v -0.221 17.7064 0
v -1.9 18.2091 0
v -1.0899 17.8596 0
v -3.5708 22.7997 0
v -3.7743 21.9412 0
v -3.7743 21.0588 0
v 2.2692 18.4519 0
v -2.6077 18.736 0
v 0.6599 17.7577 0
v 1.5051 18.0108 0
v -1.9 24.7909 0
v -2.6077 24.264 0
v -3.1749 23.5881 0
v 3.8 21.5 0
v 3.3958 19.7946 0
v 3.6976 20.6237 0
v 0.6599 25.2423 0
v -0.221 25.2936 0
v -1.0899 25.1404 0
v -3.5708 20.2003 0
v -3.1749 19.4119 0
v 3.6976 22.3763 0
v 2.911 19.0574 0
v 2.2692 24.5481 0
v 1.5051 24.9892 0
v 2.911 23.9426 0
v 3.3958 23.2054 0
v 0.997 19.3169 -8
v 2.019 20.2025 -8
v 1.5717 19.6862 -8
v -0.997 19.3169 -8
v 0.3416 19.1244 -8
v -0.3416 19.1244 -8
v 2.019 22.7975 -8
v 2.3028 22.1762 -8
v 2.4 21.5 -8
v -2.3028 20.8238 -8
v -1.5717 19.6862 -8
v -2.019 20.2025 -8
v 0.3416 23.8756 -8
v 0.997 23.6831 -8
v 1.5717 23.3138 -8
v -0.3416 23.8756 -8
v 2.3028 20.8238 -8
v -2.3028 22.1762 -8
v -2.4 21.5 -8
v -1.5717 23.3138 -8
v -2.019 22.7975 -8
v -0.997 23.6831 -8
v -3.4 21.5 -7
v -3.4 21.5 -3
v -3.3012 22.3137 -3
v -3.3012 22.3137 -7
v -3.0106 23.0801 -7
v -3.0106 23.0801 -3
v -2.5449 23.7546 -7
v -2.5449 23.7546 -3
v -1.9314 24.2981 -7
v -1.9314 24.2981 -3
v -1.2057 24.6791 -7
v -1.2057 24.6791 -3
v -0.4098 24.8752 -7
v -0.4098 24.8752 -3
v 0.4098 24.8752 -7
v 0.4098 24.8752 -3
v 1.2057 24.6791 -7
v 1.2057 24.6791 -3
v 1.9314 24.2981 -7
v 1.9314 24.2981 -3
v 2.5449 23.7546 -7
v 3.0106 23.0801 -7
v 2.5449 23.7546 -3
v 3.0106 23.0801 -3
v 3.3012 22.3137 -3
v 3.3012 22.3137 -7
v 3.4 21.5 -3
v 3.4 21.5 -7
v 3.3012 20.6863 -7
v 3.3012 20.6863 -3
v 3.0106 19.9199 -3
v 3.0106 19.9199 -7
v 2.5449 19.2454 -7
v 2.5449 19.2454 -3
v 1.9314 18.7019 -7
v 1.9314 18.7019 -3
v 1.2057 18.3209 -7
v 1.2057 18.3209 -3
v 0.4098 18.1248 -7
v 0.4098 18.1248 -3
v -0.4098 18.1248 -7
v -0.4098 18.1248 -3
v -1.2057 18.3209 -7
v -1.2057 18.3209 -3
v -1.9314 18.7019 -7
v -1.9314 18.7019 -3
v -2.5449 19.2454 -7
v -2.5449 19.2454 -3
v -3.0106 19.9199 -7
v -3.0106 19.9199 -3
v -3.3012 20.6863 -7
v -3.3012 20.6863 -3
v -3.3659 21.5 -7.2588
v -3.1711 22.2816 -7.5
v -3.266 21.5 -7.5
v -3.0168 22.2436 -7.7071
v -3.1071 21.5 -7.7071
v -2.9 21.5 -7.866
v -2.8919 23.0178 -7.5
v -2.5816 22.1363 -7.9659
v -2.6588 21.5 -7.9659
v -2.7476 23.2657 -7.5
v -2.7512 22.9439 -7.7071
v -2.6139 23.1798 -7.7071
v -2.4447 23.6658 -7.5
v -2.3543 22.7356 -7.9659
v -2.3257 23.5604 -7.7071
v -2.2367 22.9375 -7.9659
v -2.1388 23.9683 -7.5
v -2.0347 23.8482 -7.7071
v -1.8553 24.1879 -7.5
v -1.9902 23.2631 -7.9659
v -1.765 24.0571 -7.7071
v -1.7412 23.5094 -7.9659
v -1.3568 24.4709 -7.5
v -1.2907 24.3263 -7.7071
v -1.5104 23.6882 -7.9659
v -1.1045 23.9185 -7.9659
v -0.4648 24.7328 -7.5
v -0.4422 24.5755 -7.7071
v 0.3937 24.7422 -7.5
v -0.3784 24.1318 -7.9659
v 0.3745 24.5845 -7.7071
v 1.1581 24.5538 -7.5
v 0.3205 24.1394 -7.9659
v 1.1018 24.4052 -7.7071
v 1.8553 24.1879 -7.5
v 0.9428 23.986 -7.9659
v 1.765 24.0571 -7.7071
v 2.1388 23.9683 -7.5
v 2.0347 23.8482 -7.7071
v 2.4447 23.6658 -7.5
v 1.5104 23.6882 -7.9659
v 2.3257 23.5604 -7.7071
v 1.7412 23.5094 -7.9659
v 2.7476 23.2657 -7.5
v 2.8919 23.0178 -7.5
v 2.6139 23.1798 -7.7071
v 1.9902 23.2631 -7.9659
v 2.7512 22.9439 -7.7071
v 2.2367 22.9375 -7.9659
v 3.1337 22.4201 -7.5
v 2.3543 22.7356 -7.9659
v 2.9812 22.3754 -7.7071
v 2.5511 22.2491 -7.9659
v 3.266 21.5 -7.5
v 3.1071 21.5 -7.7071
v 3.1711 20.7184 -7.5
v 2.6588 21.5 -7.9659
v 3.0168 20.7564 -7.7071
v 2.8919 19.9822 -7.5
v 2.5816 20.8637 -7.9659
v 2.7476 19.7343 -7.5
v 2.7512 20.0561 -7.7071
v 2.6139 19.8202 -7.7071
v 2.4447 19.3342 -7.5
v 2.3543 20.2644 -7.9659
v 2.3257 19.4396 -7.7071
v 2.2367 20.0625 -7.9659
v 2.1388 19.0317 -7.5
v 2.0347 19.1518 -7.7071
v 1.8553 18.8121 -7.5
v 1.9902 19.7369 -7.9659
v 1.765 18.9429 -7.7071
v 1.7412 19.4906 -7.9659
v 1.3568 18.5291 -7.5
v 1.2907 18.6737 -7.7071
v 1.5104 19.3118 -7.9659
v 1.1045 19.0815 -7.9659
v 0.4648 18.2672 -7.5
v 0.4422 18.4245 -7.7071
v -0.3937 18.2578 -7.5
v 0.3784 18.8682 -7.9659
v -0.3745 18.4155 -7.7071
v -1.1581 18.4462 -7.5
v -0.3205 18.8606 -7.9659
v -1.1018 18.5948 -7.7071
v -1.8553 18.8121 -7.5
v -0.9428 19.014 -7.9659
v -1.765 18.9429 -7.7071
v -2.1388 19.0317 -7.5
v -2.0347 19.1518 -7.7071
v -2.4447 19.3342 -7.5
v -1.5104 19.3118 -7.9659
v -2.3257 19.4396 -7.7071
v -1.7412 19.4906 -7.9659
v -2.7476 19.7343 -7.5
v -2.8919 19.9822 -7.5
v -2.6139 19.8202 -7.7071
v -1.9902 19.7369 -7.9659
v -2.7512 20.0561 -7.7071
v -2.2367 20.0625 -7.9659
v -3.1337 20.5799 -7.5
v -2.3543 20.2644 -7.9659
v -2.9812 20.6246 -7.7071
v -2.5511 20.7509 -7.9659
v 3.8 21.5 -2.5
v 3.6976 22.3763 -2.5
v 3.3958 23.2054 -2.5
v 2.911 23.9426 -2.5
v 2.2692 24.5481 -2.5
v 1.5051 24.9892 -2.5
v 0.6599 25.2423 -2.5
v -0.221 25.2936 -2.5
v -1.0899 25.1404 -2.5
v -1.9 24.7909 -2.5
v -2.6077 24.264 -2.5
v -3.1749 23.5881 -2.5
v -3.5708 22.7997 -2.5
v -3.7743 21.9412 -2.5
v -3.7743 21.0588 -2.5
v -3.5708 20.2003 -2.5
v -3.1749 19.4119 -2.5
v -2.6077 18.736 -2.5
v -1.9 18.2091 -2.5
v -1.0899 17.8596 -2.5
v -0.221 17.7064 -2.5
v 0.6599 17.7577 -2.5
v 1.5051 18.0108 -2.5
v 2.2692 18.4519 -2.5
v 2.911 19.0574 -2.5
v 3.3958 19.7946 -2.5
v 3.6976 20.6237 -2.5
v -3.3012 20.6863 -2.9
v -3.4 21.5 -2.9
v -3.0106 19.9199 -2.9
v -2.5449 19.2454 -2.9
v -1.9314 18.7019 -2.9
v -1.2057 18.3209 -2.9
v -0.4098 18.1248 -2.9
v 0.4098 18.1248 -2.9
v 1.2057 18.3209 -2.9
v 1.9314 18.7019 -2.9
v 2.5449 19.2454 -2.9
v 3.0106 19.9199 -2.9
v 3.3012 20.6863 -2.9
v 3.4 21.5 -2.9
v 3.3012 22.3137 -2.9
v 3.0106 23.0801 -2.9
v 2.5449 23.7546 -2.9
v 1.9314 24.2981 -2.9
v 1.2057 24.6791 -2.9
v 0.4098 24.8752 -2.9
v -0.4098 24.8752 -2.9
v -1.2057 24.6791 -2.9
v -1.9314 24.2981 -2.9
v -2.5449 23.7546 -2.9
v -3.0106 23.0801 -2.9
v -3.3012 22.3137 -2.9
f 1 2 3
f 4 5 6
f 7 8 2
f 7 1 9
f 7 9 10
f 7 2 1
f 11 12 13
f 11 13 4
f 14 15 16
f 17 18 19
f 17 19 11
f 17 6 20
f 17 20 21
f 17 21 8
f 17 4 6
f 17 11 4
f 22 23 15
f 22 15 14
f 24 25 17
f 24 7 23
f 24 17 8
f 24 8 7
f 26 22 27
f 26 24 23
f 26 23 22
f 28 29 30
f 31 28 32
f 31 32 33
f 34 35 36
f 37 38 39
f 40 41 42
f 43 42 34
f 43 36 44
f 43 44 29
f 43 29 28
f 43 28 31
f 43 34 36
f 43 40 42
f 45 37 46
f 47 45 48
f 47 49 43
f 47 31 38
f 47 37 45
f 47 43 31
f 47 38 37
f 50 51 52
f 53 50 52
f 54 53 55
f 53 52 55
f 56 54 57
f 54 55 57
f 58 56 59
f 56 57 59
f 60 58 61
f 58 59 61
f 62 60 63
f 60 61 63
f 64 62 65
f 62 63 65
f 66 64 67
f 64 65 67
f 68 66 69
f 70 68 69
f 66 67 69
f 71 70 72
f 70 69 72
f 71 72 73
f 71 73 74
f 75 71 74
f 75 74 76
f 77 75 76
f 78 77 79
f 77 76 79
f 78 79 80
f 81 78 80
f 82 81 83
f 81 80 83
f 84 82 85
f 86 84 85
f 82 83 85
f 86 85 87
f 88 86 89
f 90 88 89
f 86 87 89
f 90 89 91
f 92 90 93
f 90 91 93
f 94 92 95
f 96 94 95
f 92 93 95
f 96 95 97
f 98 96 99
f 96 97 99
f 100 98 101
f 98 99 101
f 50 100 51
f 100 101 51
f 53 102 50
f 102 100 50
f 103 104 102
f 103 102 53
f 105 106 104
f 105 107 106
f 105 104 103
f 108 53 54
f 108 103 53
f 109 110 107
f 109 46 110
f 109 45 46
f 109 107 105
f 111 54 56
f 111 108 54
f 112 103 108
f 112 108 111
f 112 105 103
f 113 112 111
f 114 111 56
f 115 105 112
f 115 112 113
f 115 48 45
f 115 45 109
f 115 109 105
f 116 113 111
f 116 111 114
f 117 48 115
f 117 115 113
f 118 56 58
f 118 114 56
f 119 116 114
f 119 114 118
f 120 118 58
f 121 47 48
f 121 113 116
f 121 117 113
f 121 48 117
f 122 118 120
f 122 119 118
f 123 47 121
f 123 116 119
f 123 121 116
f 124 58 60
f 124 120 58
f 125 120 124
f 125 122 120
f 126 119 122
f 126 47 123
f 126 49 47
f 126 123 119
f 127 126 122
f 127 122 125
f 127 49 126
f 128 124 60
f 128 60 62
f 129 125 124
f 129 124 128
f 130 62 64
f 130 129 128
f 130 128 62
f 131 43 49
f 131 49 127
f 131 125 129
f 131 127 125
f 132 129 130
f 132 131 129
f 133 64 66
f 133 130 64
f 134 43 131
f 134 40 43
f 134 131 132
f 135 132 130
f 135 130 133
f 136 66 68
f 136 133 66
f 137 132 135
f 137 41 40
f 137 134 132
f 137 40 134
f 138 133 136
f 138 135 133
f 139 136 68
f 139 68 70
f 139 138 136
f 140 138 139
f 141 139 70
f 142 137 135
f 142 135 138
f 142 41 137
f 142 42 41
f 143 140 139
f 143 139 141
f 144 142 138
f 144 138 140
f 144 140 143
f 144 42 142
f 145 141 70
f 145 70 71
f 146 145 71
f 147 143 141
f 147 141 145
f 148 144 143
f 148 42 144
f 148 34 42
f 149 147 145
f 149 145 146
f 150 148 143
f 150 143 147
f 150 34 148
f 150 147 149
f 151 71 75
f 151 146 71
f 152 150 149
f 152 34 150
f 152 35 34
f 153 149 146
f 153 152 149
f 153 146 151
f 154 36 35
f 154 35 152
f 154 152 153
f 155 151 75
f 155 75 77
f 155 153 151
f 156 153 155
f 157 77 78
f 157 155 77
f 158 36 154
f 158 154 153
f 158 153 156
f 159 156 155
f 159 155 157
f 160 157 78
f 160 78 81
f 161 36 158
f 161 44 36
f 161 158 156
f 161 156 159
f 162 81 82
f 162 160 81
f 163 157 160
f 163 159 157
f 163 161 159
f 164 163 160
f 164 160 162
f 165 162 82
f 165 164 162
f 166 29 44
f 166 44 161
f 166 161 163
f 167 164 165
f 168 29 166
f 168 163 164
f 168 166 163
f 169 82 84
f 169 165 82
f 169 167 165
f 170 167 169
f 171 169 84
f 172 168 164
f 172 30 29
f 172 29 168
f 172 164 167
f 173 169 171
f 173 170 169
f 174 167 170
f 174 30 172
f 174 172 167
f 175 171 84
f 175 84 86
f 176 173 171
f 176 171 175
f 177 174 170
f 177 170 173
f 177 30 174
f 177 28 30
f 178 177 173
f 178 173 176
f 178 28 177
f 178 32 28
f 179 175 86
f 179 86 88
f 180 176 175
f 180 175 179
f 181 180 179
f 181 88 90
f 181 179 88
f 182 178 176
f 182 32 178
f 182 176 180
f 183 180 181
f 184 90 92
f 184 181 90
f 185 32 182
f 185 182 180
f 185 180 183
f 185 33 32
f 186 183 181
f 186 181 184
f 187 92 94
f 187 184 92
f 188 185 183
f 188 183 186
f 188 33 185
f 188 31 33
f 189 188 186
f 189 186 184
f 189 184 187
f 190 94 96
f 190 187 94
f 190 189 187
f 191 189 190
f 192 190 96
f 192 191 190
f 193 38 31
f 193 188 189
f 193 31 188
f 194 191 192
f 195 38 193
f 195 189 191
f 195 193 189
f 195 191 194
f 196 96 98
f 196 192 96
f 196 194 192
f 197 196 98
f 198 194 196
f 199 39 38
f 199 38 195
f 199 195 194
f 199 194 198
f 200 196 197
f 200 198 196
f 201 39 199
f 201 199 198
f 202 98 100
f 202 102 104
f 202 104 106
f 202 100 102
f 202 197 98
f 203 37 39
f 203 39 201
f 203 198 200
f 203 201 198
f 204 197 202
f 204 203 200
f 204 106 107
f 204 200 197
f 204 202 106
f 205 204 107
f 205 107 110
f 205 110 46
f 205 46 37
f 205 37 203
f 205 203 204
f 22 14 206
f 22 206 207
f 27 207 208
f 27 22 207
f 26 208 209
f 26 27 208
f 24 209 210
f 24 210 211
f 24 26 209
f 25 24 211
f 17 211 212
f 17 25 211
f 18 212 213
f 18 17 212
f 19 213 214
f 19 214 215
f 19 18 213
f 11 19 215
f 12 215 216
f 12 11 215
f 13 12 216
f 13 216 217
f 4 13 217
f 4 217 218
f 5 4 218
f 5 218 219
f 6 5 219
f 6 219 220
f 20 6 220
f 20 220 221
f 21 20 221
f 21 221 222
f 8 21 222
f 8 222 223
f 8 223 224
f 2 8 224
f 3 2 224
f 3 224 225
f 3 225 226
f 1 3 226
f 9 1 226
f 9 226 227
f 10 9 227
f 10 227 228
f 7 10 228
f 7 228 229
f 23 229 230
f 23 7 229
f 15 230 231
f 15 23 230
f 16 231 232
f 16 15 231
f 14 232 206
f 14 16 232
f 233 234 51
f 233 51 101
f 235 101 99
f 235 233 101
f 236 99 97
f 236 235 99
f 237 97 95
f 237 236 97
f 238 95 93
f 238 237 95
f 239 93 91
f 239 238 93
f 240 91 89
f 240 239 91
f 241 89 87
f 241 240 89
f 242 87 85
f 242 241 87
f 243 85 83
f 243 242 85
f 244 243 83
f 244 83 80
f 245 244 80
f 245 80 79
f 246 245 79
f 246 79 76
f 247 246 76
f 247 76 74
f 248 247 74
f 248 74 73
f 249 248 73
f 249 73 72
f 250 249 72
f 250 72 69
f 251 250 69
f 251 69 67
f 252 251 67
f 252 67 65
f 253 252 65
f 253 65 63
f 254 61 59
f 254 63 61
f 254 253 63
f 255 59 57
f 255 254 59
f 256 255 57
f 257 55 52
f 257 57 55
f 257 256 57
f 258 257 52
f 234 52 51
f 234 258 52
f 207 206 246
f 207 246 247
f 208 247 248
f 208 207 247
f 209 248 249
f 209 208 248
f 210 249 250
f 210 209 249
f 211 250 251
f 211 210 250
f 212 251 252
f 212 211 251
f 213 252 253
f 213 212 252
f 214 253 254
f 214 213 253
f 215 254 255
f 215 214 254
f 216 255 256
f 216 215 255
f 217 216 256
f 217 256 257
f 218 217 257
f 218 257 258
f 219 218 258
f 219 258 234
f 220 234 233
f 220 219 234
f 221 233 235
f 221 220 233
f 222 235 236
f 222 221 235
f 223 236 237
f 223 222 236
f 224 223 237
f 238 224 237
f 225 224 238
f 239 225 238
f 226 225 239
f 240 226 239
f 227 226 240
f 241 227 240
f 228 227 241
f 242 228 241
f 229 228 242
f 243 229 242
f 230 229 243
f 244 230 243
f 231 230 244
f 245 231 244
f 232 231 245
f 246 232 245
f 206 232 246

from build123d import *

# Parameters (mm, degrees)
SKETCH1_R           = 3.8
BOSS_EXTRUDE1_DEPTH = 3
SKETCH2_R           = 3.4
BOSS_EXTRUDE2_DEPTH = 5
FILLET1_R           = 1
CHAMFER1_SIZE       = 0.5


with BuildPart() as part:
    # Sketch1 → Boss-Extrude1 (new body)
    with BuildSketch(Plane.XY):
        with Locations((0, 21.5)):
            Circle(SKETCH1_R)
    extrude(amount=-BOSS_EXTRUDE1_DEPTH)

    # Sketch2 → Boss-Extrude2 (add)
    with BuildSketch(Plane(origin=(0, 0, -3), x_dir=(-1, 0, 0), z_dir=(0, 0, -1))):
        with Locations((0, 21.5)):
            Circle(SKETCH2_R)
    extrude(amount=BOSS_EXTRUDE2_DEPTH)

    # Fillet1
    fillet1_edges = [part.edges().sort_by_distance(p)[0] for p in [
        (3.4, 21.5, -8),
    ]]
    fillet(fillet1_edges, radius=FILLET1_R)

    # Chamfer1
    # the kernel refuses this chamfer: 0.5 mm, written as the material it takes off along each edge
    with BuildSketch(Plane(origin=(0, 21.5, -3), x_dir=(1, 0, 0), z_dir=(0, -1, 0))) as chamfer1_piece_1_section:
        Polygon((3.8 - CHAMFER1_SIZE, 0), (3.8, CHAMFER1_SIZE), (3.8, 0), align=None)
    chamfer1_piece_1 = revolve(axis=Axis((0, 21.5, -3), (0, 0, 1)), mode=Mode.PRIVATE)
    chamfer1_piece_1 = chamfer1_piece_1 - Plane(origin=(0, 21.5, -2.703116332), x_dir=(-1, 0, 0), z_dir=(0, 0, 1)) * Cylinder(3.4, 16, mode=Mode.PRIVATE)
    add(chamfer1_piece_1, mode=Mode.SUBTRACT)


solid = part.part
